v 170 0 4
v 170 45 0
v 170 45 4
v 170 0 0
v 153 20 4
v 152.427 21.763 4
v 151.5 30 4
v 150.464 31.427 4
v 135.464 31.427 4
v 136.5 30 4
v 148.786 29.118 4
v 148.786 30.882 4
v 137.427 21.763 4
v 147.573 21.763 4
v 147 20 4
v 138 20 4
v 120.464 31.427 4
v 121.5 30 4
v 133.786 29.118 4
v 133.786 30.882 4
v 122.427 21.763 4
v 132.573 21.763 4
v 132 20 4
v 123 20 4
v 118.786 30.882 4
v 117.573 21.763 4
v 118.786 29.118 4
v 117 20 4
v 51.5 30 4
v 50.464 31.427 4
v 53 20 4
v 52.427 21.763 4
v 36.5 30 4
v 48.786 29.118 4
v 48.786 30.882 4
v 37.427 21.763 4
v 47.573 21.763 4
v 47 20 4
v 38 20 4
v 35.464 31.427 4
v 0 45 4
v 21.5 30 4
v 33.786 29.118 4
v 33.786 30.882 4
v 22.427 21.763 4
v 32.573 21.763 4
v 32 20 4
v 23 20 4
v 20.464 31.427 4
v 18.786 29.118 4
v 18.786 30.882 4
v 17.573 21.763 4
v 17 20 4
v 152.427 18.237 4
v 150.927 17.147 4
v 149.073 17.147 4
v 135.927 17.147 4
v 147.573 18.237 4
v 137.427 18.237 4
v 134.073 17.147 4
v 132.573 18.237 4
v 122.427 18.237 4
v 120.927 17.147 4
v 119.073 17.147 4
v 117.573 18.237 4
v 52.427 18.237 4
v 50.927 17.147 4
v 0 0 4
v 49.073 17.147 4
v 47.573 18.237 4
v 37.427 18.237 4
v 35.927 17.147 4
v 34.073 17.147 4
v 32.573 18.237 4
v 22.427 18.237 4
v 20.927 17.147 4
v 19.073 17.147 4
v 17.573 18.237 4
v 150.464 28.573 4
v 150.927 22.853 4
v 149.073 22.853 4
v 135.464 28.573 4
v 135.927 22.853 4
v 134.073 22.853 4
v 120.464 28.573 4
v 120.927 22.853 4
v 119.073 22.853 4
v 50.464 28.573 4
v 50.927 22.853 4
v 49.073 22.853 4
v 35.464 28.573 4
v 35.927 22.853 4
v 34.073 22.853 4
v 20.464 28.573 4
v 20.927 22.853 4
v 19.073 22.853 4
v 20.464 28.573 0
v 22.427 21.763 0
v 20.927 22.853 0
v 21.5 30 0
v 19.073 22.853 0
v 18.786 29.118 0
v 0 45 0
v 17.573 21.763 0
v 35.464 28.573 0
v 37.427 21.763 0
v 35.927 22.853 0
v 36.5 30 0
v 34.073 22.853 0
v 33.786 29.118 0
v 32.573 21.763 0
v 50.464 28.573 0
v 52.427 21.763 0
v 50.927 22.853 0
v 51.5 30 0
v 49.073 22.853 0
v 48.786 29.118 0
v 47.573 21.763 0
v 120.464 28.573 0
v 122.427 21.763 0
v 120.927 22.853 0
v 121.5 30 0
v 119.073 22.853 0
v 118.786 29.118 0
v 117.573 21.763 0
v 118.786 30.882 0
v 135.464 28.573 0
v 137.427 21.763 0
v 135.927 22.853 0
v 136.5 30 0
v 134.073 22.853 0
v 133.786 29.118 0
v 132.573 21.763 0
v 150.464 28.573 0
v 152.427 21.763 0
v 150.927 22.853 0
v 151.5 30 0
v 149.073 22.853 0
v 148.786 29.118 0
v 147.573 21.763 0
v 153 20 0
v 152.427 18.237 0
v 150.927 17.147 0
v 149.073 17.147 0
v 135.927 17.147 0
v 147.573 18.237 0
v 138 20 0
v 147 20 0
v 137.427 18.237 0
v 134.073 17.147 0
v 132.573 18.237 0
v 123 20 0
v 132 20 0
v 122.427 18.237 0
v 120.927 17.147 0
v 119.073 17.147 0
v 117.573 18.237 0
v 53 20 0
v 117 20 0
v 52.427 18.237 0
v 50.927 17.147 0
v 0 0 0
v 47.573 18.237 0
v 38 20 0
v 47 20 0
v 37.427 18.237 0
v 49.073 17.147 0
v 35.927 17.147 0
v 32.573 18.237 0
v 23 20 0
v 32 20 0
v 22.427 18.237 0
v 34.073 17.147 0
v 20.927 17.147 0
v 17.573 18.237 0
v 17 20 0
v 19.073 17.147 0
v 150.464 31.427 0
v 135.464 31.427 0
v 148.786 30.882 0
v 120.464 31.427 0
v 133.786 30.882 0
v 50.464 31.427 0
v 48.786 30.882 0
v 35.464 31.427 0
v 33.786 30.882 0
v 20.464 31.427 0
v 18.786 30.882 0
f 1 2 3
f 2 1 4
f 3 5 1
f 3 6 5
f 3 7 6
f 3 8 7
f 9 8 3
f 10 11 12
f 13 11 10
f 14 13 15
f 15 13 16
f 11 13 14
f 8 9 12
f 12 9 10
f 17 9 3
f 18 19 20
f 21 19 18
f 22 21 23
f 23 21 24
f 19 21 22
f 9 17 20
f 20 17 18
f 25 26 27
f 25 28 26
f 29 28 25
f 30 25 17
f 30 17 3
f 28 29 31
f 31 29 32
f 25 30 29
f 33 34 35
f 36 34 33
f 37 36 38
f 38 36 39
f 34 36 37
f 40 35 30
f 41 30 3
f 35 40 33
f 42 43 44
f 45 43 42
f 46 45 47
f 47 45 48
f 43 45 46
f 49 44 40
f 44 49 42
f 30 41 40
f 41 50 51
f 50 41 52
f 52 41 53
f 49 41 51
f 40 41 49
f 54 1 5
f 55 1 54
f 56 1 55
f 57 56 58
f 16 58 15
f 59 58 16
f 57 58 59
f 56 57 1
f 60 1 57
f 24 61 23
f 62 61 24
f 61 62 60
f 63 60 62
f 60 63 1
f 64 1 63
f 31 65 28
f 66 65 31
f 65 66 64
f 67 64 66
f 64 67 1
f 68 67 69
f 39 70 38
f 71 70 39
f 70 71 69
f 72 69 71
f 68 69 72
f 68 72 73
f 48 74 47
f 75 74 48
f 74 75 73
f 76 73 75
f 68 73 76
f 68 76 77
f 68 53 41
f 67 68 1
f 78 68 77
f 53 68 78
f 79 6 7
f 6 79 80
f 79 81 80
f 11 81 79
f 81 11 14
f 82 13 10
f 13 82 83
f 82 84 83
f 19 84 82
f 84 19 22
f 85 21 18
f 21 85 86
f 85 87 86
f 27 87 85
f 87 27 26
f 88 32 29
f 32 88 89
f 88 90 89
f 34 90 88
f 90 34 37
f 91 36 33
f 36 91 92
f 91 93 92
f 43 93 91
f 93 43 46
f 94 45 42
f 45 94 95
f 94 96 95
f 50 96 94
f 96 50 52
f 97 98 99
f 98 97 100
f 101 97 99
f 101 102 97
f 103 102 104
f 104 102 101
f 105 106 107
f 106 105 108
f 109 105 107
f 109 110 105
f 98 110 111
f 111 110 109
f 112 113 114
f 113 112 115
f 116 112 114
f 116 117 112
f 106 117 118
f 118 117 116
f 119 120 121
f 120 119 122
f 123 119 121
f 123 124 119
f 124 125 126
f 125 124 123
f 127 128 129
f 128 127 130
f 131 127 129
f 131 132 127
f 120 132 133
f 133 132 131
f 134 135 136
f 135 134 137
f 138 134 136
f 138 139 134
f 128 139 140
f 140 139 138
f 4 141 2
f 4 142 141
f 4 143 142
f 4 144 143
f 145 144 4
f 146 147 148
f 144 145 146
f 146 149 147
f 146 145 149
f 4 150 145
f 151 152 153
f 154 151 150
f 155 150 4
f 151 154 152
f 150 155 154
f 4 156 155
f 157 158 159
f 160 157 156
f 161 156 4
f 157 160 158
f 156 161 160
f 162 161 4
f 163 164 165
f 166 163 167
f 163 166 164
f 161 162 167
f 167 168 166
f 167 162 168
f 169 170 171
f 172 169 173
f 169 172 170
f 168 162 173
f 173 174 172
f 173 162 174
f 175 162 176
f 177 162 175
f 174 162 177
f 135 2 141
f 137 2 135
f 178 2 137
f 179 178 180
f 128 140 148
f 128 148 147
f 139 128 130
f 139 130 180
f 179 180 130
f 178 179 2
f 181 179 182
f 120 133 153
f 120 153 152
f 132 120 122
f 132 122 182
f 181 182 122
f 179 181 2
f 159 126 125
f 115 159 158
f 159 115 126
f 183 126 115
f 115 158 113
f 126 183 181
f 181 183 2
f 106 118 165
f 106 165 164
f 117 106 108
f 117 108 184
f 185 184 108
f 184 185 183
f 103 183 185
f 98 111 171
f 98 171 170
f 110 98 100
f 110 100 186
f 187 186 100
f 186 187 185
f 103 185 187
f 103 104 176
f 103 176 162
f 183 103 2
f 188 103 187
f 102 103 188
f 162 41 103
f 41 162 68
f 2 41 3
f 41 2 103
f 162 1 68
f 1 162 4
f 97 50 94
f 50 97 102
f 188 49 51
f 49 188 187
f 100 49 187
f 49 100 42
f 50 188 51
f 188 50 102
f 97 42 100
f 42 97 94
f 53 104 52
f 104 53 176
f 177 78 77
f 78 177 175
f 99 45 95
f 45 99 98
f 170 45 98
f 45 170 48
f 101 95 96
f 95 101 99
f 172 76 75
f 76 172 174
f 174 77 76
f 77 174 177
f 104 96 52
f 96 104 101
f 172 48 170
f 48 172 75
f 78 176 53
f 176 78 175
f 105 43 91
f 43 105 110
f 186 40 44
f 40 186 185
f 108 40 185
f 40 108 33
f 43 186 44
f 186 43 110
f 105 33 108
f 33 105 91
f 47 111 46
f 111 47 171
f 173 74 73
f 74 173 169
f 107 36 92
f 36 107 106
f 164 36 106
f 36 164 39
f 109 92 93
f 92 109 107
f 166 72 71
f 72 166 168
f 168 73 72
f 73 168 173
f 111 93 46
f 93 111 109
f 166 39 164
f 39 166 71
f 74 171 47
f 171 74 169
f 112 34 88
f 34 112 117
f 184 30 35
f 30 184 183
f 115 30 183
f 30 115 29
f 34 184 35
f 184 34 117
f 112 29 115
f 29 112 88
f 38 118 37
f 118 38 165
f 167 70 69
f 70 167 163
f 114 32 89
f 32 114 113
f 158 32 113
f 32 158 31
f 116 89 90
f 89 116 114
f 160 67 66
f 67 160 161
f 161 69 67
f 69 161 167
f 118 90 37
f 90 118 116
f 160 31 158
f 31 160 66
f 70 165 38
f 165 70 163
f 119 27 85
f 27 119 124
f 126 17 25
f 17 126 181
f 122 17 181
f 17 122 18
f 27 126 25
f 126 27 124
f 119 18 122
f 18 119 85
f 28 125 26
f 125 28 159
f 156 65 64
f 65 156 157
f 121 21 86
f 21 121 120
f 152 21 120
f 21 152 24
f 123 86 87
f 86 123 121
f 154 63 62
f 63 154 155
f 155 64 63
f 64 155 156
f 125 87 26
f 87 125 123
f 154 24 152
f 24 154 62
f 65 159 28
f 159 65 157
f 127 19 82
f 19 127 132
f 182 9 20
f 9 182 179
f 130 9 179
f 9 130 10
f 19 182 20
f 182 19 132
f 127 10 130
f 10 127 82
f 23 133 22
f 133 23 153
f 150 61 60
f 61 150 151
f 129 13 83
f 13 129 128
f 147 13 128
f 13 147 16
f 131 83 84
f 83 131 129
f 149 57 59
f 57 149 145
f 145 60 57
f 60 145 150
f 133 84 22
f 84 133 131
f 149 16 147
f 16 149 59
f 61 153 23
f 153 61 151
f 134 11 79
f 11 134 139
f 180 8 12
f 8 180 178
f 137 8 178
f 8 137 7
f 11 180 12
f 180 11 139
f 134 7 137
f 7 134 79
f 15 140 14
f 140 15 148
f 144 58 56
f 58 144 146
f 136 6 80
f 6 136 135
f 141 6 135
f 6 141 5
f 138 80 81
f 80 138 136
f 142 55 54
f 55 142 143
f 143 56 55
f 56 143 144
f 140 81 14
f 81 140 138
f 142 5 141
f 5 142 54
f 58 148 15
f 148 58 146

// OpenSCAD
// WORK IN PROGRESS!

difference() {
    union() {
      cube([170,45,4], false);
      translate([85,30,6]) 
        scale([0.05,0.05,.05]) 
        surface(
          "../../railroads/chesapeake-and-ohio/logo-1948-55.png", 
          center=true, 
          invert=true, 
          convexity=10);
      translate([85,5,3]) scale([1,1,5]) text("Louisa", halign="center");
    };
    translate([20,30,2])cylinder(h=5, r1=1.5, r2=1.5, center=true);
    translate([20,20,2])cylinder(h=5, r1=3, r2=3, center=true);
    translate([35,30,2])cylinder(h=5, r1=1.5, r2=1.5, center=true);
    translate([35,20,2])cylinder(h=5, r1=3, r2=3, center=true);
    translate([50,30,2])cylinder(h=5, r1=1.5, r2=1.5, center=true);
    translate([50,20,2])cylinder(h=5, r1=3, r2=3, center=true);
    translate([120,30,2])cylinder(h=5, r1=1.5, r2=1.5, center=true);
    translate([120,20,2])cylinder(h=5, r1=3, r2=3, center=true);
    translate([135,30,2])cylinder(h=5, r1=1.5, r2=1.5, center=true);
    translate([135,20,2])cylinder(h=5, r1=3, r2=3, center=true);
    translate([150,30,2])cylinder(h=5, r1=1.5, r2=1.5, center=true);
    translate([150,20,2])cylinder(h=5, r1=3, r2=3, center=true);
};
